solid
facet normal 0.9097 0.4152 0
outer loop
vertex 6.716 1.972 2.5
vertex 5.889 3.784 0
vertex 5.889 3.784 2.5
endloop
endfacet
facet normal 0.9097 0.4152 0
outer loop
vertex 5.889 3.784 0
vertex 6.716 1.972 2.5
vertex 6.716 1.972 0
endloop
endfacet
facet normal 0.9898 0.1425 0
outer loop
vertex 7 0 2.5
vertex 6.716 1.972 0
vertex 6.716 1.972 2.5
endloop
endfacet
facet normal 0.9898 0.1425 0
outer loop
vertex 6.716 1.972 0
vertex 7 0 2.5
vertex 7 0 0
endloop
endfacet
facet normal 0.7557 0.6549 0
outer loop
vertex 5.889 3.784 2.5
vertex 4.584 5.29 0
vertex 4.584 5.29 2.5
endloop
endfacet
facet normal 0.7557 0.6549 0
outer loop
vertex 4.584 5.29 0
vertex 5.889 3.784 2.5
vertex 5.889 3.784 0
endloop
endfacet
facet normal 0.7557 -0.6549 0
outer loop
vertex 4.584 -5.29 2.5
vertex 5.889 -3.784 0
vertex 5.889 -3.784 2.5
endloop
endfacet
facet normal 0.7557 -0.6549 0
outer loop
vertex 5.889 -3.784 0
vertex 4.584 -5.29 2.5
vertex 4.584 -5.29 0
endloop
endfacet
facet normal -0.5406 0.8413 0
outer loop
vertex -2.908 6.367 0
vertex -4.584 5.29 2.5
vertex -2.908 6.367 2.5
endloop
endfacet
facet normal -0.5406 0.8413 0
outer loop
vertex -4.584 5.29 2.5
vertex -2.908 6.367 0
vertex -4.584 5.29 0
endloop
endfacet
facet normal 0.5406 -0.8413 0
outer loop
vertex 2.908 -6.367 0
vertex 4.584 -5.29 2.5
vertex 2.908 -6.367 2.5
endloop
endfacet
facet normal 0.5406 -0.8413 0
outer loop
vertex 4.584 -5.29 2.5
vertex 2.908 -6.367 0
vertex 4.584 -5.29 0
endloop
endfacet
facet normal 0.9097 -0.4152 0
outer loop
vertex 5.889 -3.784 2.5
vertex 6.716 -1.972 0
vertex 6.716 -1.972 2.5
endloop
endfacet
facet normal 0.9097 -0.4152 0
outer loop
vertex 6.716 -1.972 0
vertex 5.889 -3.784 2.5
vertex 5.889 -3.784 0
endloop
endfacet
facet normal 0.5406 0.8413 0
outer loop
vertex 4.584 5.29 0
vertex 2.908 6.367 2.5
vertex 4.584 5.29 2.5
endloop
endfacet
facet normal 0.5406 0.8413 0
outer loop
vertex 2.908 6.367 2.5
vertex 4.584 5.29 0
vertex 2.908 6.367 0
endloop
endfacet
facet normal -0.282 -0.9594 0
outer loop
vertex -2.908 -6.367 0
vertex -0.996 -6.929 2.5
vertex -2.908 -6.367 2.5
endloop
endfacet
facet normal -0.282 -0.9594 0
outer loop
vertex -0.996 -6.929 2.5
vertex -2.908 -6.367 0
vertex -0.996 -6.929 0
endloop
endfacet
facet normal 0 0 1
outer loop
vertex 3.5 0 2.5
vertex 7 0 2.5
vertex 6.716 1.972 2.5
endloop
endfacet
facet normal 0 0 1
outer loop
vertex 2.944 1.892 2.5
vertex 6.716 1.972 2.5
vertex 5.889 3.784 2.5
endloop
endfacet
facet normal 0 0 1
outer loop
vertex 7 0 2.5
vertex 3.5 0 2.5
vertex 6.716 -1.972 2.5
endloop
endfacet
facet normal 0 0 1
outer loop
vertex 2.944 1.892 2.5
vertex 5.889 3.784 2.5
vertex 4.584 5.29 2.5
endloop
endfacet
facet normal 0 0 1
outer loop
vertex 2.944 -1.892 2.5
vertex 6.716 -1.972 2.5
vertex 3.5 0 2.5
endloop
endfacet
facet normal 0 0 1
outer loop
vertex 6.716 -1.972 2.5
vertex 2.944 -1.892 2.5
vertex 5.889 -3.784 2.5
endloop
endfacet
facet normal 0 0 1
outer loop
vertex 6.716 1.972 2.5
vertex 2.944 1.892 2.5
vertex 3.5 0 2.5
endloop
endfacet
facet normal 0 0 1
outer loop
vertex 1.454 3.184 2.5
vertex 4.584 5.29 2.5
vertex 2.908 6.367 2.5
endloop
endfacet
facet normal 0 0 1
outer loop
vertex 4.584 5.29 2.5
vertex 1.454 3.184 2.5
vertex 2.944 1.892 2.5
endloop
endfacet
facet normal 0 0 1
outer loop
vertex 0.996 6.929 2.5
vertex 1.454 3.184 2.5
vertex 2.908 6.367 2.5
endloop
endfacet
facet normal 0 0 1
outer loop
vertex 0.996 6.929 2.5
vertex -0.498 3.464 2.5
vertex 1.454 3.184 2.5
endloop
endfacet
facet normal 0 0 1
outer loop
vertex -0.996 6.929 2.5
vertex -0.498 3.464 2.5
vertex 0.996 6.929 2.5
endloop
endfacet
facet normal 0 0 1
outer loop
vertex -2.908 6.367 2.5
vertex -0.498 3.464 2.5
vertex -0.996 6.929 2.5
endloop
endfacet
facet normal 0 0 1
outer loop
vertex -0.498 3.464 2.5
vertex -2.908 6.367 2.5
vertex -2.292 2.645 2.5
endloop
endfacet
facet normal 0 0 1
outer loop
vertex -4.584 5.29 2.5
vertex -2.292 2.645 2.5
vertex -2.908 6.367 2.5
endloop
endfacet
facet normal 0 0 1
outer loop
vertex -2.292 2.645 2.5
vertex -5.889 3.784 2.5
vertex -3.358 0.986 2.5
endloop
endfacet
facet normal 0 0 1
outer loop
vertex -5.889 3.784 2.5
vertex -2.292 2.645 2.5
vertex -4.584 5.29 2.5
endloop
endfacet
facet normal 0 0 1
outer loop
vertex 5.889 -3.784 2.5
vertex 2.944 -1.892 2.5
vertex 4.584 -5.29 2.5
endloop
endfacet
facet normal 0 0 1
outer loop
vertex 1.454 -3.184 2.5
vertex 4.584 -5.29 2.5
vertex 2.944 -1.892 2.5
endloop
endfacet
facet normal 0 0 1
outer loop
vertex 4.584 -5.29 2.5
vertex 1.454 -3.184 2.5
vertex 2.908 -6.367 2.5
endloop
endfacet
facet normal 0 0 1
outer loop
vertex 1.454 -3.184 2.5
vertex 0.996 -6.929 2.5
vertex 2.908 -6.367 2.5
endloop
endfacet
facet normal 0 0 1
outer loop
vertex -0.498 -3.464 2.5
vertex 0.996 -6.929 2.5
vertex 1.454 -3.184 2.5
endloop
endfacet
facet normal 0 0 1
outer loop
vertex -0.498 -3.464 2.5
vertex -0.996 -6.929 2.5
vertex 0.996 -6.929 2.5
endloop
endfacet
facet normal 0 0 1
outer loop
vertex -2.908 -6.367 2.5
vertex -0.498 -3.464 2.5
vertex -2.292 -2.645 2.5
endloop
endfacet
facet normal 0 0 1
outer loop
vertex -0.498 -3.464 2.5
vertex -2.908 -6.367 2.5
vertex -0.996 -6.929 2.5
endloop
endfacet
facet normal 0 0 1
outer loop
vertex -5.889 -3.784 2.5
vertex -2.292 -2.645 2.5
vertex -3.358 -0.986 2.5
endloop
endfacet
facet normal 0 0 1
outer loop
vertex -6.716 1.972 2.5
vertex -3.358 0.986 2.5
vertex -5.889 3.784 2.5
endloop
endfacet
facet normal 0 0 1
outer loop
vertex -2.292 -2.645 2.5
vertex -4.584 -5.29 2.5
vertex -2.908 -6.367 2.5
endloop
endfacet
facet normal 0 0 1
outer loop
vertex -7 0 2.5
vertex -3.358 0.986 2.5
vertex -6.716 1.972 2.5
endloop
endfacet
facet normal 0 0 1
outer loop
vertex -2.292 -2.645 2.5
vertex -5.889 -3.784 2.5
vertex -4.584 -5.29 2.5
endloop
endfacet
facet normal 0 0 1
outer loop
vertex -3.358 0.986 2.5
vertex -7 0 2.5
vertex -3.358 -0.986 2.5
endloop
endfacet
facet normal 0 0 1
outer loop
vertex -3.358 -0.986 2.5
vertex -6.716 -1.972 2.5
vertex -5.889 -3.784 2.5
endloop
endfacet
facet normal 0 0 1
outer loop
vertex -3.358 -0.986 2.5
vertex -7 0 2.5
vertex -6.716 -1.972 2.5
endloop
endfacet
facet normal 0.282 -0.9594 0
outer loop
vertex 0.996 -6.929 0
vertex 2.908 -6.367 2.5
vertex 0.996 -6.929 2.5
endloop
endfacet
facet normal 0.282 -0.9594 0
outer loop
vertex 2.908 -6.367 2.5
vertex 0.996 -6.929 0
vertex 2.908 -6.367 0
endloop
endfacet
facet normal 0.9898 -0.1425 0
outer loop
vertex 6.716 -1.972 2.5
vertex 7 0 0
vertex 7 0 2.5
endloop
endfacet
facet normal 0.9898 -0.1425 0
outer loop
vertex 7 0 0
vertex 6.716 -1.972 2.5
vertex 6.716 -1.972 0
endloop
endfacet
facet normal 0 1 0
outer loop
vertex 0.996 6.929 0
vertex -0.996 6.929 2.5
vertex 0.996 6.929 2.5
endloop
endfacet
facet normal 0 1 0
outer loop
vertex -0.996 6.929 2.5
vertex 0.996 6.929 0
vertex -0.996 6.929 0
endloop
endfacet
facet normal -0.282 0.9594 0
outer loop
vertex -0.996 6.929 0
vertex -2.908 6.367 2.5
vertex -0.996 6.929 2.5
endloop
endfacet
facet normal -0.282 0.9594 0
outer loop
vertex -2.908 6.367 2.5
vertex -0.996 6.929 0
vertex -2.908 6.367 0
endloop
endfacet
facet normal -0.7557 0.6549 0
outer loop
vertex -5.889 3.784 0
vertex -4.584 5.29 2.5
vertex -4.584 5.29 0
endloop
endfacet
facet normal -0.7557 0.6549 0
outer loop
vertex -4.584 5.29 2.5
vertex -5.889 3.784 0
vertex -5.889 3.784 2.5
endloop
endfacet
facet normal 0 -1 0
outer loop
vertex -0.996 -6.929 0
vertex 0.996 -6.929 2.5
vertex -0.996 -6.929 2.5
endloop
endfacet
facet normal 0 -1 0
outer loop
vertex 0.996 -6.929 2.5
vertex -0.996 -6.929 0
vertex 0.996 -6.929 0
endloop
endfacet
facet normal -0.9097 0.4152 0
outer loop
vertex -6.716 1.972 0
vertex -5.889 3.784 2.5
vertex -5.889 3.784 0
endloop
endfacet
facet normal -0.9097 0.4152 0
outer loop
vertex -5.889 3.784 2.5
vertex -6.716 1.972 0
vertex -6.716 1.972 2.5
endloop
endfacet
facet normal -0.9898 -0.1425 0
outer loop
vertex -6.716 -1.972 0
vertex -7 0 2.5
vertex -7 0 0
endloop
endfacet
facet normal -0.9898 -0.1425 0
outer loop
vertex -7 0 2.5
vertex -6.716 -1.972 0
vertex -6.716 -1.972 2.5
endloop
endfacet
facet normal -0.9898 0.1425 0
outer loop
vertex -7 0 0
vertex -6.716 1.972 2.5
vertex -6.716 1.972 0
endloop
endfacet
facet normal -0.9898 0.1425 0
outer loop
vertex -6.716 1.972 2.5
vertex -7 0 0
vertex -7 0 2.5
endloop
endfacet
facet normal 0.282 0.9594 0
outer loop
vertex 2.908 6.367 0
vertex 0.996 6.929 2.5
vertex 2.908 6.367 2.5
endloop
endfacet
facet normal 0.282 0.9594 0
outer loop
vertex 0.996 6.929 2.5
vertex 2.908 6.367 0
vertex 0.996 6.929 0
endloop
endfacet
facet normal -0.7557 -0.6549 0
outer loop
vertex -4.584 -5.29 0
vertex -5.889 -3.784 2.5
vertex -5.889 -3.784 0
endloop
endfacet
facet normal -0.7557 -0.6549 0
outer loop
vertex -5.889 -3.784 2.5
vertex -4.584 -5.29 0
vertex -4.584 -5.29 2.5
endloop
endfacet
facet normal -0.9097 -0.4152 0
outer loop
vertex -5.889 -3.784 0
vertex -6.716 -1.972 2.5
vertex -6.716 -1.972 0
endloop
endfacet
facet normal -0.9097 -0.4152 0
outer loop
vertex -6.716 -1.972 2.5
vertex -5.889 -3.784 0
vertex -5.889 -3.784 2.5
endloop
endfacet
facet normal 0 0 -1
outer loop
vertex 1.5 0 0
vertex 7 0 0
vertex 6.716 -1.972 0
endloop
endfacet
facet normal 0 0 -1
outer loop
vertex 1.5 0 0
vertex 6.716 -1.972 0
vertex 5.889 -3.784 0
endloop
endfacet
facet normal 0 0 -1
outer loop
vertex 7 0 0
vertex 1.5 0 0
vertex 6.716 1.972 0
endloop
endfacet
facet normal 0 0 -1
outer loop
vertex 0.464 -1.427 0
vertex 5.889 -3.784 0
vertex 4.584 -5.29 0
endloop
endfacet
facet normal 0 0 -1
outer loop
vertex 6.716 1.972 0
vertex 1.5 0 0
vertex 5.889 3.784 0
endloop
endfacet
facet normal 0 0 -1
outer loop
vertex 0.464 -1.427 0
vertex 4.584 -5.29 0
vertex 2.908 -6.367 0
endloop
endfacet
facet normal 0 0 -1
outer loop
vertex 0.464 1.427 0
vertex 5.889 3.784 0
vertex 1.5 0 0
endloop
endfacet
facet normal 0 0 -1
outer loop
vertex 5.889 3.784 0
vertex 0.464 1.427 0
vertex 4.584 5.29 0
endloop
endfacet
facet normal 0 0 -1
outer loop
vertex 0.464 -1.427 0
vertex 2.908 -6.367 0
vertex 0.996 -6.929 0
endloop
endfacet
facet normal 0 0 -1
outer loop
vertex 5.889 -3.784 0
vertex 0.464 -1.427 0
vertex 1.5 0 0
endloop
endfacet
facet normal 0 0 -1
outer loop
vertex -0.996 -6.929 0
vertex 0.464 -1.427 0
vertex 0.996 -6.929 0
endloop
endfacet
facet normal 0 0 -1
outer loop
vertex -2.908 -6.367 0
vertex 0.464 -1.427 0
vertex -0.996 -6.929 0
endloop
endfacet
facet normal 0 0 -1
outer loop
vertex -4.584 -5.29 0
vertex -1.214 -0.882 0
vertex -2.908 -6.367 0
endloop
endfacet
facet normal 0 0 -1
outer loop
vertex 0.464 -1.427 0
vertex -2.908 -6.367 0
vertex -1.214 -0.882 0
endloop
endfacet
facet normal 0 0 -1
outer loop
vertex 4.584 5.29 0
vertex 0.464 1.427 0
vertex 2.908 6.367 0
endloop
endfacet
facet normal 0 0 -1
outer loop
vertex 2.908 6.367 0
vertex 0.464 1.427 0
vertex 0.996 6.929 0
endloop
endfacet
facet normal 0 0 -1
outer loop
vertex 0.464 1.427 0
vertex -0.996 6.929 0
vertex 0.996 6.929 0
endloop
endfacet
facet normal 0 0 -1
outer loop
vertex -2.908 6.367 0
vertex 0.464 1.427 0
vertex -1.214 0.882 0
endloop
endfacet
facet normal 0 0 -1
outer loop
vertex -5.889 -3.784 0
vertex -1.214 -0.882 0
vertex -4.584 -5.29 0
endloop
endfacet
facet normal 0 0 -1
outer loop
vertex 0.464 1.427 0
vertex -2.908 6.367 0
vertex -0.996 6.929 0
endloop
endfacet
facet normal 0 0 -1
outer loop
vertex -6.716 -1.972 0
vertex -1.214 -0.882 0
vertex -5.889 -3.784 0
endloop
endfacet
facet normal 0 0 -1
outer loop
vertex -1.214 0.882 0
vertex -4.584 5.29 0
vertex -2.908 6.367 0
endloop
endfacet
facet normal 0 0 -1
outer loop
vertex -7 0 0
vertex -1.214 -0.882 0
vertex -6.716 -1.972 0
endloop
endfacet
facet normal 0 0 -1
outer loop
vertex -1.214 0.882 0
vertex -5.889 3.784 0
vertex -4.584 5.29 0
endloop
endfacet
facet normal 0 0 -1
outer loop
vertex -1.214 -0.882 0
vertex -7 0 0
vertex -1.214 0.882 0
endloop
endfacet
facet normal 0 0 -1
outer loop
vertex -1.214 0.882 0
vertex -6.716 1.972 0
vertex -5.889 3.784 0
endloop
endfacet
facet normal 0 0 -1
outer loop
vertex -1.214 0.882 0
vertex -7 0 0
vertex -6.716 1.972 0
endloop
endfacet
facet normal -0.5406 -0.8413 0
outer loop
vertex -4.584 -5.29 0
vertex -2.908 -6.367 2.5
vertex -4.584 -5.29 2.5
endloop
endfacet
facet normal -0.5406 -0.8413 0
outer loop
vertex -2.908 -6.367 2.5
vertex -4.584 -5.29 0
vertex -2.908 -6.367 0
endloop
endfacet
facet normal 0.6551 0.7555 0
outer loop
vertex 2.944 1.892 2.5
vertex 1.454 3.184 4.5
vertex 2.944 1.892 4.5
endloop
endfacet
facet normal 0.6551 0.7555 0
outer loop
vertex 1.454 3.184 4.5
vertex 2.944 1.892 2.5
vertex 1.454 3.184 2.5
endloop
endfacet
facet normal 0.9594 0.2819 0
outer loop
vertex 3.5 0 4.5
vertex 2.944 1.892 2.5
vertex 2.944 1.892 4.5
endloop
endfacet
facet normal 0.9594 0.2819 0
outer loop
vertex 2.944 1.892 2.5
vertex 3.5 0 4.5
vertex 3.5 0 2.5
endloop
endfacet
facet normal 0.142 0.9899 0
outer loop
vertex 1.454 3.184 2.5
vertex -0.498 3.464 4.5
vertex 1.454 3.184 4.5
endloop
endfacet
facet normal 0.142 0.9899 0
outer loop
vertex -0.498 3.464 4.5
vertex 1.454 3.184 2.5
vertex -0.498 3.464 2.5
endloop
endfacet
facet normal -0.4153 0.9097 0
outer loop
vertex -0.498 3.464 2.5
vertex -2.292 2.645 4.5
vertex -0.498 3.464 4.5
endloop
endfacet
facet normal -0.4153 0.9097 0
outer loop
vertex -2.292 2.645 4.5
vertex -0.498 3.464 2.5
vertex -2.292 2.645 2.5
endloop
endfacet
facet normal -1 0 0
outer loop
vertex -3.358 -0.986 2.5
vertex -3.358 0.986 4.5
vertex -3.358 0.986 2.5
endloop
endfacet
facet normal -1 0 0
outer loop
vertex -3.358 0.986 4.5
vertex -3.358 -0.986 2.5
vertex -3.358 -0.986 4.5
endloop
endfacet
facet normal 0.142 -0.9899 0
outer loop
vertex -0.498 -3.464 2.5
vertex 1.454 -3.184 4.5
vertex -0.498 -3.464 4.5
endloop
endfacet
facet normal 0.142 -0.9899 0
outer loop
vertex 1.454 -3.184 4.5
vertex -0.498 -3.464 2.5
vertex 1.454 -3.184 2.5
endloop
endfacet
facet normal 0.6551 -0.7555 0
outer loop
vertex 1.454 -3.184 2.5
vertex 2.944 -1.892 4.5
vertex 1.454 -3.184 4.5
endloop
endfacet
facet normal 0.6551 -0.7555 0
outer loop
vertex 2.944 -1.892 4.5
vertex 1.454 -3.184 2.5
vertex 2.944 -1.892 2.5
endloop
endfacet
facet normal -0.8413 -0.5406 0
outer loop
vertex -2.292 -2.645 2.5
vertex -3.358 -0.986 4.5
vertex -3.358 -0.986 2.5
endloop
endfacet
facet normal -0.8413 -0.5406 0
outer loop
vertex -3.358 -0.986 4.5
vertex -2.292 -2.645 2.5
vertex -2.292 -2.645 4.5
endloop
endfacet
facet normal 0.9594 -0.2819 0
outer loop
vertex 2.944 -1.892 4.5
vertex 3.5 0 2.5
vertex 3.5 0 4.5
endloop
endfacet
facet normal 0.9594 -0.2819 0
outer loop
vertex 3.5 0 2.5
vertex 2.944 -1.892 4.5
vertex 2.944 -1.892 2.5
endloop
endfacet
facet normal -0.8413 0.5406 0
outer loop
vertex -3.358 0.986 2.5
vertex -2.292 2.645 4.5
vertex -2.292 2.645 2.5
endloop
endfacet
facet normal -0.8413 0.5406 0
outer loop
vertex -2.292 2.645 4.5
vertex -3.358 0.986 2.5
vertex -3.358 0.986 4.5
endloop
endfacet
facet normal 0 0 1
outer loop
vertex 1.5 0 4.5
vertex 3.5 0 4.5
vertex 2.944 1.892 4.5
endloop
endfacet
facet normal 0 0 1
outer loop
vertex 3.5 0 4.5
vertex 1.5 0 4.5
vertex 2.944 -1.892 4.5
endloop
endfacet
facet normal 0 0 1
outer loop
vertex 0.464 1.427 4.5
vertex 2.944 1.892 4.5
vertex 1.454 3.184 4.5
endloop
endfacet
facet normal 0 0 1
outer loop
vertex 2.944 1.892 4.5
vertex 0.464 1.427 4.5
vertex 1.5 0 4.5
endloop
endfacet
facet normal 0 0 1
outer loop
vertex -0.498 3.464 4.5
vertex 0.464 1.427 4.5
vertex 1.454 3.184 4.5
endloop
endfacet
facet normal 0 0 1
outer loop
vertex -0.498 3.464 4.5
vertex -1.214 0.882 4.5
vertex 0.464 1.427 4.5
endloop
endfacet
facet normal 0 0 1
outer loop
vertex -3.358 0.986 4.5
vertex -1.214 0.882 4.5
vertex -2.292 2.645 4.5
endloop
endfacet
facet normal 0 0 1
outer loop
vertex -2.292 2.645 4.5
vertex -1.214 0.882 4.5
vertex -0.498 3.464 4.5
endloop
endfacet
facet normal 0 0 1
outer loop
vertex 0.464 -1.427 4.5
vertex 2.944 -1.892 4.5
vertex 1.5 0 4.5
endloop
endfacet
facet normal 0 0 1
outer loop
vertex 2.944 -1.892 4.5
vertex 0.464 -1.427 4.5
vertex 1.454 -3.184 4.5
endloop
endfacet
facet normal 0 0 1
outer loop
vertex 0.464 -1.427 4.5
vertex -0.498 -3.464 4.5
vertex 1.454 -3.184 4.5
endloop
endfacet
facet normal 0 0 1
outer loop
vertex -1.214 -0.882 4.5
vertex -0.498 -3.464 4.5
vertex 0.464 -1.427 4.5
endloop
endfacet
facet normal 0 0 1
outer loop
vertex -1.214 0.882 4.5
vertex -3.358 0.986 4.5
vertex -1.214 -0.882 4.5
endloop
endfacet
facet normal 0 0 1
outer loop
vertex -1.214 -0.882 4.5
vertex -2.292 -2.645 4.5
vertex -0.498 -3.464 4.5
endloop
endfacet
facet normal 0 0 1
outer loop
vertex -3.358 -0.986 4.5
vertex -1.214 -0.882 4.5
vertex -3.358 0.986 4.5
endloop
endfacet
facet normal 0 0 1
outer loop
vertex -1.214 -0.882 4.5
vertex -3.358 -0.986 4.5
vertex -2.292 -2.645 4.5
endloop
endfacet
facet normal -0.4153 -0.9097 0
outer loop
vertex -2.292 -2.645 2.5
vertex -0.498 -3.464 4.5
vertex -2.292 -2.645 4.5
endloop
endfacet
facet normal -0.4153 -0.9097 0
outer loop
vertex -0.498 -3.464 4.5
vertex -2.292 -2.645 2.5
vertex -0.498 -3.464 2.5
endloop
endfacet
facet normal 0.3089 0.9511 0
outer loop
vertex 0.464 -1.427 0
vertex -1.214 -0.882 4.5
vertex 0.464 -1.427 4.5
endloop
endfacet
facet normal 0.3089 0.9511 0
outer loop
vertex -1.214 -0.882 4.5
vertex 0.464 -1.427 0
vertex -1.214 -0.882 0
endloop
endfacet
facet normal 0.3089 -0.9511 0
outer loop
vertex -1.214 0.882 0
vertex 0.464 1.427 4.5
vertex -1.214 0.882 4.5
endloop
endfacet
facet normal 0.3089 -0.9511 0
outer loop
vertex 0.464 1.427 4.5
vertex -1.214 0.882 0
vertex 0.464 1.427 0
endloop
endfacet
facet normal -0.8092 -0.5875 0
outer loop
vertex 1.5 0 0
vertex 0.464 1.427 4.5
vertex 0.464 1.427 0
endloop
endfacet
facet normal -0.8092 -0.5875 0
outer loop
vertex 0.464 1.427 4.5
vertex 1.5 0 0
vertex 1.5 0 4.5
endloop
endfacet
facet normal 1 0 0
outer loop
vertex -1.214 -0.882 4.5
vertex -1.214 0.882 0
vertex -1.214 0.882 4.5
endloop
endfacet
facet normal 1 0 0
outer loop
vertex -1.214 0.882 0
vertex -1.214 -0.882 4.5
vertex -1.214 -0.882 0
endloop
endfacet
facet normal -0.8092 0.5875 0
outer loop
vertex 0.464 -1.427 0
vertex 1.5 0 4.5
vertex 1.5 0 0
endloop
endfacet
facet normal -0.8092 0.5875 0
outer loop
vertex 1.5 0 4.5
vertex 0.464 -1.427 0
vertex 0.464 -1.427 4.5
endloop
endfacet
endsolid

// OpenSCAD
// part_id: spp17
// name: Date pointer base for superior plate stage
// source_drawing_ids: DRW-056;DRW-008
// units: mm
// revision: 0.1-placeholder
// SPDX-License-Identifier: MIT

module part_spp17(base_d = 14, base_h = 2.5, boss_d = 7, boss_h = 2, bore_d = 3) {
    difference() {
        union() {
            cylinder(d = base_d, h = base_h, center = false);
            cylinder(d = boss_d, h = base_h + boss_h, center = false);
        }
        translate([0, 0, -0.1]) cylinder(d = bore_d, h = base_h + boss_h + 0.2, center = false);
    }
}


// ---- "main guard" ----
// Default to previewing when opened directly:
if (is_undef(__LIB_MODE__)) {
    part_spp17();
}
